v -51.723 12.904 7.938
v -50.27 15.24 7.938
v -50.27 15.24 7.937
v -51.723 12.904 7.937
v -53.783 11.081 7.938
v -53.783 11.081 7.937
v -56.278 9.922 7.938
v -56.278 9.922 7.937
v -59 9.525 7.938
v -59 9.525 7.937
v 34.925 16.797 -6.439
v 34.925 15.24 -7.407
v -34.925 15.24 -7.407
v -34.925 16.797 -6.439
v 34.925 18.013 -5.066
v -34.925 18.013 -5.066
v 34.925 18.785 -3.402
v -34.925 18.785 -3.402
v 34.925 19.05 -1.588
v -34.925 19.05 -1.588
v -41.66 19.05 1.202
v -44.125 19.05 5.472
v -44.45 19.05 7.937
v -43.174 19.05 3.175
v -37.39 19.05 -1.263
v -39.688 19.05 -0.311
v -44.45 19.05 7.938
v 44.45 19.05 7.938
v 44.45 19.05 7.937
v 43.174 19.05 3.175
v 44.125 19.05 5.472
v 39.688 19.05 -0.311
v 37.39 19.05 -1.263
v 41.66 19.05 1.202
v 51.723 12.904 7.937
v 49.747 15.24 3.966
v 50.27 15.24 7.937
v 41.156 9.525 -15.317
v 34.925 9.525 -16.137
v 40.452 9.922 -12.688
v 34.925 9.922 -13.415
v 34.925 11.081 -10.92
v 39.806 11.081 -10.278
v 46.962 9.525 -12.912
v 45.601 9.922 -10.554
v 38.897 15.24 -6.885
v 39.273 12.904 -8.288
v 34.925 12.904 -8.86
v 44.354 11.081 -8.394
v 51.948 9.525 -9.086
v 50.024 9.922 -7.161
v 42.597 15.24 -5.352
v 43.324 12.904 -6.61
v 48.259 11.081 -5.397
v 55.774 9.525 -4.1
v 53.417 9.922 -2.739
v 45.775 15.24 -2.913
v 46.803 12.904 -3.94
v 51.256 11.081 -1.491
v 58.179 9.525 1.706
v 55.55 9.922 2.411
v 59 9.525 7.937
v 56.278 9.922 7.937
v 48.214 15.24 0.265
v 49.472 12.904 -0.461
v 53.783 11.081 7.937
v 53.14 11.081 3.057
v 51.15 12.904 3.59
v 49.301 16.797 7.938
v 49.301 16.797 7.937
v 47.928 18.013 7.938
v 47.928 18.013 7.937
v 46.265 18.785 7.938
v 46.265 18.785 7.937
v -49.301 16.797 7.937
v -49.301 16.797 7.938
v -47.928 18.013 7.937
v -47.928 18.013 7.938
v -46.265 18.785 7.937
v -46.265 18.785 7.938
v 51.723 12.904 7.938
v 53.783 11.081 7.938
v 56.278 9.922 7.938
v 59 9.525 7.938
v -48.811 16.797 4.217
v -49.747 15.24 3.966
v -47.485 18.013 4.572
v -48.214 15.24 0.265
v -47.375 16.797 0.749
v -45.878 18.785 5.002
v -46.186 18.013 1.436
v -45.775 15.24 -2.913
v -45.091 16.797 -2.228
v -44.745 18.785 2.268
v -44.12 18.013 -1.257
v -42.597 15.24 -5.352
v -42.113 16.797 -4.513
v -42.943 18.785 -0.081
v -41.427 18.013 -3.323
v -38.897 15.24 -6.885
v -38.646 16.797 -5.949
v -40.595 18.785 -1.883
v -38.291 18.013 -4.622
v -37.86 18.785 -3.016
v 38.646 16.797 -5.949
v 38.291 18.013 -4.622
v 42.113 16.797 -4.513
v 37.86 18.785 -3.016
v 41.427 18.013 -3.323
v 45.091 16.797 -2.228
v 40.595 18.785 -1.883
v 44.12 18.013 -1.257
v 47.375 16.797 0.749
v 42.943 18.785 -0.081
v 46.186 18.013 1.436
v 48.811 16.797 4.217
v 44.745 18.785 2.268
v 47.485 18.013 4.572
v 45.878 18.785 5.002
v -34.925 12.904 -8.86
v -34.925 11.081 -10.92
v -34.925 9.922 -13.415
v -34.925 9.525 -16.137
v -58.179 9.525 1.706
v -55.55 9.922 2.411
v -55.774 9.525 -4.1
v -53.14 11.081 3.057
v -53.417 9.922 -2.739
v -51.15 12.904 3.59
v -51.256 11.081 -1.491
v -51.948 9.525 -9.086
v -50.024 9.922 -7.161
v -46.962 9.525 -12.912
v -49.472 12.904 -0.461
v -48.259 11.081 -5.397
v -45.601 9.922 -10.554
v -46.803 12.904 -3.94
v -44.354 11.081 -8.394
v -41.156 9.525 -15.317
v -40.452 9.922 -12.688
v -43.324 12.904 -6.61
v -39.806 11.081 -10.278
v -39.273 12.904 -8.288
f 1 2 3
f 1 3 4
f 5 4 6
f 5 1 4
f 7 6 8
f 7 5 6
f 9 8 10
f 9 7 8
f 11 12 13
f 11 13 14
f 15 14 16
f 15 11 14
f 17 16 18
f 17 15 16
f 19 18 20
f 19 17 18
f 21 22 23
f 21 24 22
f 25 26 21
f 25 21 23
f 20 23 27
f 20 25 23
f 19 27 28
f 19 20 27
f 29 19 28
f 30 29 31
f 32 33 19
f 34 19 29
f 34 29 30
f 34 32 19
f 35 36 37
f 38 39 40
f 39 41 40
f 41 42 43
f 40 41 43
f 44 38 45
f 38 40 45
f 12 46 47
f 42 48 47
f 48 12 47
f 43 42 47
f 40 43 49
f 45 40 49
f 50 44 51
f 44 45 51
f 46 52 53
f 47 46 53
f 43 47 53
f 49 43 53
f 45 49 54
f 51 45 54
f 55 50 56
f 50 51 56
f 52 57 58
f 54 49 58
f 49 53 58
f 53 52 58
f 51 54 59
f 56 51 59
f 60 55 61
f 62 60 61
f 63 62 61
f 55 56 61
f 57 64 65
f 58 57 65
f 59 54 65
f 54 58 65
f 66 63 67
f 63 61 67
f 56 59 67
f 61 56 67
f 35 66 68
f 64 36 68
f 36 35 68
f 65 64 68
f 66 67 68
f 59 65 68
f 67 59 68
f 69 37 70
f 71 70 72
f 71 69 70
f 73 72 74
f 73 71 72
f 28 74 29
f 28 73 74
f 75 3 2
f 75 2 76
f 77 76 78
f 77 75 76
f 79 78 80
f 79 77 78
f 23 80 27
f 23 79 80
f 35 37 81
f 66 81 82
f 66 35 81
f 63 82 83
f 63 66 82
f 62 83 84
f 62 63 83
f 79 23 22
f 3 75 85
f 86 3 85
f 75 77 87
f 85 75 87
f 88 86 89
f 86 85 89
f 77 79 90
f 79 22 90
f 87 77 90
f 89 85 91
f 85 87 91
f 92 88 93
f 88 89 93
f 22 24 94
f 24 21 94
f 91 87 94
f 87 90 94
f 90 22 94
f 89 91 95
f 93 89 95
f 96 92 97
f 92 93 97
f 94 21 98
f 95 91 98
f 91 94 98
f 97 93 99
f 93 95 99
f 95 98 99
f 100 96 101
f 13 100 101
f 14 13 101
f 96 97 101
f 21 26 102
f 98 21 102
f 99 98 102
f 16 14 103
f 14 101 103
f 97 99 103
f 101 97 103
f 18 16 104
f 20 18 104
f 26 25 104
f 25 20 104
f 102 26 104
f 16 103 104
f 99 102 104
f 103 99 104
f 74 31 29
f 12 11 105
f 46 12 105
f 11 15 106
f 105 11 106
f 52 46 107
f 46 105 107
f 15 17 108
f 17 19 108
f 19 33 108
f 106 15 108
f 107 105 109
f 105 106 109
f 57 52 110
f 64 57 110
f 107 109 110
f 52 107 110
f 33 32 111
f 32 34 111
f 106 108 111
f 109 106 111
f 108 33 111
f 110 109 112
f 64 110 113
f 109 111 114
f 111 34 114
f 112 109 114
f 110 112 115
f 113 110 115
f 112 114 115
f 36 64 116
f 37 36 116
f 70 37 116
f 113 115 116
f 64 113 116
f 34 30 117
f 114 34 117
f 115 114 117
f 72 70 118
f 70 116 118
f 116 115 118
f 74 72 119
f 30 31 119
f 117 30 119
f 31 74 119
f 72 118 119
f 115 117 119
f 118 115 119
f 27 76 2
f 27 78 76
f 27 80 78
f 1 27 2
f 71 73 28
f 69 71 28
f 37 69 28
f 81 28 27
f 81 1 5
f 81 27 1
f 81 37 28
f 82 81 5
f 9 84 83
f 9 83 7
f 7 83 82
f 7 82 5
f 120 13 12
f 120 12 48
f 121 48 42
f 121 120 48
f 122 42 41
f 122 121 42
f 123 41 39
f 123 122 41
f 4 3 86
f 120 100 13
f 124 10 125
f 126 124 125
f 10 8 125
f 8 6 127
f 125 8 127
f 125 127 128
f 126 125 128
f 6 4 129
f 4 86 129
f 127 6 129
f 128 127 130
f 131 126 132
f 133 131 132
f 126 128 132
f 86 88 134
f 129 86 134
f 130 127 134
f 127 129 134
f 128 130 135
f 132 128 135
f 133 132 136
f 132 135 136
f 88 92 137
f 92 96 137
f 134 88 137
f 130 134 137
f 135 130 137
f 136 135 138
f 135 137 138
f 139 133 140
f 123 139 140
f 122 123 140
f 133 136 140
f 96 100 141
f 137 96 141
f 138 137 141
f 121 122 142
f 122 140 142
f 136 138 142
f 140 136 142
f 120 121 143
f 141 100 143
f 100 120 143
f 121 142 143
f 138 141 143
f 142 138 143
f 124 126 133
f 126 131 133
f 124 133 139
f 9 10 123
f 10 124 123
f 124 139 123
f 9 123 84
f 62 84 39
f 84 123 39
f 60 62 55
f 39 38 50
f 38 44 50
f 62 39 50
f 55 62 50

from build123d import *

# Parameters (mm, degrees)
SKETCH1_W           = 152.4
SKETCH1_H           = 50.8
BOSS_EXTRUDE1_DEPTH = 9.525
SKETCH2_W           = 101.6
SKETCH2_H           = 15.875
BOSS_EXTRUDE2_DEPTH = 9.525
FILLET1_R           = 15.875
FILLET2_R           = 6.35
FILLET3_R           = 9.525
SKETCH3_W           = 152.4
SKETCH3_H           = 50.8
CUT_EXTRUDE1_DEPTH  = 81.88464395


# Some blends are built 0.0001 mm under size
with BuildPart() as part:
    # Sketch1 → Boss-Extrude1 (new body)
    with BuildSketch(Plane(origin=(0, 0, 0), x_dir=(1, 0, 0), z_dir=(0, 1, 0))):
        Rectangle(SKETCH1_W, SKETCH1_H)
    extrude(amount=BOSS_EXTRUDE1_DEPTH)

    # Sketch2 → Boss-Extrude2 (add)
    with BuildSketch(Plane(origin=(0, 9.525, 0), x_dir=(1, 0, 0), z_dir=(0, 1, 0))):
        Rectangle(SKETCH2_W, SKETCH2_H)
    extrude(amount=BOSS_EXTRUDE2_DEPTH)

    # Fillet1
    fillet1_edges = [part.edges().sort_by_distance(p)[0] for p in [
        (-50.8, 14.2875, -7.9375),
        (50.8, 14.2875, -7.9375),
    ]]
    fillet(fillet1_edges, radius=FILLET1_R - 0.0001)  # a hair under: the kernel refuses the full size

    # Fillet2
    fillet2_edges = [part.edges().sort_by_distance(p)[0] for p in [
        (0, 19.05, -7.9375),
        (46.150349441, 19.05, -3.287849441),
        (-46.150349441, 19.05, -3.287849441),
    ]]
    fillet(fillet2_edges, radius=FILLET2_R)

    # Fillet3
    # the kernel refuses this fillet: 9.525 mm, written as the material it adds along each edge
    with BuildSketch(Plane(origin=(-34.9251, 9.525, 7.9374), x_dir=(-1, 0, 0), z_dir=(0, 0, 1))) as fillet3_piece_1:
        with BuildLine():
            CenterArc((24.074577831, -9.525), FILLET3_R, 90, 66.421821522)
            Line((24.074577831, 0), (24.074577831, 0.9525))
            Line((24.074577831, 0.9525), (15.8749, 0.9525))
            Line((15.8749, 0.9525), (14.9224, 0))
            ThreePointArc((14.9224, 0), (14.9224, -3.175), (14.471790463, -5.334))
            Line((14.471790463, -5.334), (15.344771133, -5.715))
        make_face()
    revolve(axis=Axis((-34.9251, 9.525, 7.9374), (0, -1, 0)), revolution_arc=90)
    with BuildSketch(Plane(origin=(34.9251, 9.525, 7.9374), x_dir=(0, 0, -1), z_dir=(-1, 0, 0))) as fillet3_piece_2:
        with BuildLine():
            CenterArc((24.074577831, -9.525), FILLET3_R, 90, 66.421821522)
            Line((15.344771133, -5.715), (14.471790463, -5.334))
            ThreePointArc((14.471790463, -5.334), (14.9224, -3.175), (14.9224, 0))
            Line((14.9224, 0), (15.8749, 0.9525))
            Line((15.8749, 0.9525), (24.074577831, 0.9525))
            Line((24.074577831, 0.9525), (24.074577831, 0))
        make_face()
    revolve(axis=Axis((34.9251, 9.525, 7.9374), (0, -1, 0)), revolution_arc=90)
    with BuildSketch(Plane(origin=(-34.9251, 9.525, -7.9375), x_dir=(0, 0, -1), z_dir=(1, 0, 0))) as fillet3_piece_3:
        with BuildLine():
            CenterArc((8.199677831, 9.525), FILLET3_R, 203.578178478, 66.421821522)
            Line((-0.530128867, 5.715), (-1.403109537, 5.334))
            ThreePointArc((-1.403109537, 5.334), (-0.9525, 3.175), (-0.9525, 0))
            Line((-0.9525, 0), (0, -0.9525))
            Line((0, -0.9525), (8.199677831, -0.9525))
            Line((8.199677831, -0.9525), (8.199677831, 0))
        make_face()
    extrude(amount=69.8502)
    with BuildSketch(Plane(origin=(50.8, 9.525, 7.9374), x_dir=(1, 0, 0), z_dir=(0, 0, 1))) as fillet3_piece_4:
        with BuildLine():
            CenterArc((8.199677831, 9.525), FILLET3_R, 203.578178478, 66.421821522)
            Line((-0.530128867, 5.715), (-1.403109537, 5.334))
            ThreePointArc((-1.403109537, 5.334), (-0.9525, 3.175), (-0.9525, 0))
            Line((-0.9525, 0), (0, -0.9525))
            Line((0, -0.9525), (8.199677831, -0.9525))
            Line((8.199677831, -0.9525), (8.199677831, 0))
        make_face()
    extrude(amount=0.0001)
    with BuildSketch(Plane(origin=(-50.8, 9.525, 7.9375), x_dir=(0.09236442858628247, 0.9957252695055647, 0), z_dir=(0, 0, -1))) as fillet3_piece_5:
        with BuildLine():
            CenterArc((8.726924635, -9.044397601), FILLET3_R, 108.27853287, 66.421821522)
            Line((-0.757358557, -8.164626419), (-1.705786877, -8.0766493))
            Line((-1.705786877, -8.0766493), (-0.948428319, 0.087977118))
            Line((-0.948428319, 0.087977118), (0.087977118, 0.948428319))
            ThreePointArc((0.087977118, 0.948428319), (3.249404849, 0.655171258), (5.440795998, 0.90443976))
            Line((5.440795998, 0.90443976), (5.739534965, 0))
        make_face()
    extrude(amount=0.0001)

    # Sketch3 → Cut-Extrude1 (cut, through all)
    with BuildSketch(Plane(origin=(0, 9.525, 0), x_dir=(1, 0, 0), z_dir=(0, 1, 0))):
        Rectangle(SKETCH3_W, SKETCH3_H)
    extrude(amount=-CUT_EXTRUDE1_DEPTH, mode=Mode.SUBTRACT)


solid = part.part
